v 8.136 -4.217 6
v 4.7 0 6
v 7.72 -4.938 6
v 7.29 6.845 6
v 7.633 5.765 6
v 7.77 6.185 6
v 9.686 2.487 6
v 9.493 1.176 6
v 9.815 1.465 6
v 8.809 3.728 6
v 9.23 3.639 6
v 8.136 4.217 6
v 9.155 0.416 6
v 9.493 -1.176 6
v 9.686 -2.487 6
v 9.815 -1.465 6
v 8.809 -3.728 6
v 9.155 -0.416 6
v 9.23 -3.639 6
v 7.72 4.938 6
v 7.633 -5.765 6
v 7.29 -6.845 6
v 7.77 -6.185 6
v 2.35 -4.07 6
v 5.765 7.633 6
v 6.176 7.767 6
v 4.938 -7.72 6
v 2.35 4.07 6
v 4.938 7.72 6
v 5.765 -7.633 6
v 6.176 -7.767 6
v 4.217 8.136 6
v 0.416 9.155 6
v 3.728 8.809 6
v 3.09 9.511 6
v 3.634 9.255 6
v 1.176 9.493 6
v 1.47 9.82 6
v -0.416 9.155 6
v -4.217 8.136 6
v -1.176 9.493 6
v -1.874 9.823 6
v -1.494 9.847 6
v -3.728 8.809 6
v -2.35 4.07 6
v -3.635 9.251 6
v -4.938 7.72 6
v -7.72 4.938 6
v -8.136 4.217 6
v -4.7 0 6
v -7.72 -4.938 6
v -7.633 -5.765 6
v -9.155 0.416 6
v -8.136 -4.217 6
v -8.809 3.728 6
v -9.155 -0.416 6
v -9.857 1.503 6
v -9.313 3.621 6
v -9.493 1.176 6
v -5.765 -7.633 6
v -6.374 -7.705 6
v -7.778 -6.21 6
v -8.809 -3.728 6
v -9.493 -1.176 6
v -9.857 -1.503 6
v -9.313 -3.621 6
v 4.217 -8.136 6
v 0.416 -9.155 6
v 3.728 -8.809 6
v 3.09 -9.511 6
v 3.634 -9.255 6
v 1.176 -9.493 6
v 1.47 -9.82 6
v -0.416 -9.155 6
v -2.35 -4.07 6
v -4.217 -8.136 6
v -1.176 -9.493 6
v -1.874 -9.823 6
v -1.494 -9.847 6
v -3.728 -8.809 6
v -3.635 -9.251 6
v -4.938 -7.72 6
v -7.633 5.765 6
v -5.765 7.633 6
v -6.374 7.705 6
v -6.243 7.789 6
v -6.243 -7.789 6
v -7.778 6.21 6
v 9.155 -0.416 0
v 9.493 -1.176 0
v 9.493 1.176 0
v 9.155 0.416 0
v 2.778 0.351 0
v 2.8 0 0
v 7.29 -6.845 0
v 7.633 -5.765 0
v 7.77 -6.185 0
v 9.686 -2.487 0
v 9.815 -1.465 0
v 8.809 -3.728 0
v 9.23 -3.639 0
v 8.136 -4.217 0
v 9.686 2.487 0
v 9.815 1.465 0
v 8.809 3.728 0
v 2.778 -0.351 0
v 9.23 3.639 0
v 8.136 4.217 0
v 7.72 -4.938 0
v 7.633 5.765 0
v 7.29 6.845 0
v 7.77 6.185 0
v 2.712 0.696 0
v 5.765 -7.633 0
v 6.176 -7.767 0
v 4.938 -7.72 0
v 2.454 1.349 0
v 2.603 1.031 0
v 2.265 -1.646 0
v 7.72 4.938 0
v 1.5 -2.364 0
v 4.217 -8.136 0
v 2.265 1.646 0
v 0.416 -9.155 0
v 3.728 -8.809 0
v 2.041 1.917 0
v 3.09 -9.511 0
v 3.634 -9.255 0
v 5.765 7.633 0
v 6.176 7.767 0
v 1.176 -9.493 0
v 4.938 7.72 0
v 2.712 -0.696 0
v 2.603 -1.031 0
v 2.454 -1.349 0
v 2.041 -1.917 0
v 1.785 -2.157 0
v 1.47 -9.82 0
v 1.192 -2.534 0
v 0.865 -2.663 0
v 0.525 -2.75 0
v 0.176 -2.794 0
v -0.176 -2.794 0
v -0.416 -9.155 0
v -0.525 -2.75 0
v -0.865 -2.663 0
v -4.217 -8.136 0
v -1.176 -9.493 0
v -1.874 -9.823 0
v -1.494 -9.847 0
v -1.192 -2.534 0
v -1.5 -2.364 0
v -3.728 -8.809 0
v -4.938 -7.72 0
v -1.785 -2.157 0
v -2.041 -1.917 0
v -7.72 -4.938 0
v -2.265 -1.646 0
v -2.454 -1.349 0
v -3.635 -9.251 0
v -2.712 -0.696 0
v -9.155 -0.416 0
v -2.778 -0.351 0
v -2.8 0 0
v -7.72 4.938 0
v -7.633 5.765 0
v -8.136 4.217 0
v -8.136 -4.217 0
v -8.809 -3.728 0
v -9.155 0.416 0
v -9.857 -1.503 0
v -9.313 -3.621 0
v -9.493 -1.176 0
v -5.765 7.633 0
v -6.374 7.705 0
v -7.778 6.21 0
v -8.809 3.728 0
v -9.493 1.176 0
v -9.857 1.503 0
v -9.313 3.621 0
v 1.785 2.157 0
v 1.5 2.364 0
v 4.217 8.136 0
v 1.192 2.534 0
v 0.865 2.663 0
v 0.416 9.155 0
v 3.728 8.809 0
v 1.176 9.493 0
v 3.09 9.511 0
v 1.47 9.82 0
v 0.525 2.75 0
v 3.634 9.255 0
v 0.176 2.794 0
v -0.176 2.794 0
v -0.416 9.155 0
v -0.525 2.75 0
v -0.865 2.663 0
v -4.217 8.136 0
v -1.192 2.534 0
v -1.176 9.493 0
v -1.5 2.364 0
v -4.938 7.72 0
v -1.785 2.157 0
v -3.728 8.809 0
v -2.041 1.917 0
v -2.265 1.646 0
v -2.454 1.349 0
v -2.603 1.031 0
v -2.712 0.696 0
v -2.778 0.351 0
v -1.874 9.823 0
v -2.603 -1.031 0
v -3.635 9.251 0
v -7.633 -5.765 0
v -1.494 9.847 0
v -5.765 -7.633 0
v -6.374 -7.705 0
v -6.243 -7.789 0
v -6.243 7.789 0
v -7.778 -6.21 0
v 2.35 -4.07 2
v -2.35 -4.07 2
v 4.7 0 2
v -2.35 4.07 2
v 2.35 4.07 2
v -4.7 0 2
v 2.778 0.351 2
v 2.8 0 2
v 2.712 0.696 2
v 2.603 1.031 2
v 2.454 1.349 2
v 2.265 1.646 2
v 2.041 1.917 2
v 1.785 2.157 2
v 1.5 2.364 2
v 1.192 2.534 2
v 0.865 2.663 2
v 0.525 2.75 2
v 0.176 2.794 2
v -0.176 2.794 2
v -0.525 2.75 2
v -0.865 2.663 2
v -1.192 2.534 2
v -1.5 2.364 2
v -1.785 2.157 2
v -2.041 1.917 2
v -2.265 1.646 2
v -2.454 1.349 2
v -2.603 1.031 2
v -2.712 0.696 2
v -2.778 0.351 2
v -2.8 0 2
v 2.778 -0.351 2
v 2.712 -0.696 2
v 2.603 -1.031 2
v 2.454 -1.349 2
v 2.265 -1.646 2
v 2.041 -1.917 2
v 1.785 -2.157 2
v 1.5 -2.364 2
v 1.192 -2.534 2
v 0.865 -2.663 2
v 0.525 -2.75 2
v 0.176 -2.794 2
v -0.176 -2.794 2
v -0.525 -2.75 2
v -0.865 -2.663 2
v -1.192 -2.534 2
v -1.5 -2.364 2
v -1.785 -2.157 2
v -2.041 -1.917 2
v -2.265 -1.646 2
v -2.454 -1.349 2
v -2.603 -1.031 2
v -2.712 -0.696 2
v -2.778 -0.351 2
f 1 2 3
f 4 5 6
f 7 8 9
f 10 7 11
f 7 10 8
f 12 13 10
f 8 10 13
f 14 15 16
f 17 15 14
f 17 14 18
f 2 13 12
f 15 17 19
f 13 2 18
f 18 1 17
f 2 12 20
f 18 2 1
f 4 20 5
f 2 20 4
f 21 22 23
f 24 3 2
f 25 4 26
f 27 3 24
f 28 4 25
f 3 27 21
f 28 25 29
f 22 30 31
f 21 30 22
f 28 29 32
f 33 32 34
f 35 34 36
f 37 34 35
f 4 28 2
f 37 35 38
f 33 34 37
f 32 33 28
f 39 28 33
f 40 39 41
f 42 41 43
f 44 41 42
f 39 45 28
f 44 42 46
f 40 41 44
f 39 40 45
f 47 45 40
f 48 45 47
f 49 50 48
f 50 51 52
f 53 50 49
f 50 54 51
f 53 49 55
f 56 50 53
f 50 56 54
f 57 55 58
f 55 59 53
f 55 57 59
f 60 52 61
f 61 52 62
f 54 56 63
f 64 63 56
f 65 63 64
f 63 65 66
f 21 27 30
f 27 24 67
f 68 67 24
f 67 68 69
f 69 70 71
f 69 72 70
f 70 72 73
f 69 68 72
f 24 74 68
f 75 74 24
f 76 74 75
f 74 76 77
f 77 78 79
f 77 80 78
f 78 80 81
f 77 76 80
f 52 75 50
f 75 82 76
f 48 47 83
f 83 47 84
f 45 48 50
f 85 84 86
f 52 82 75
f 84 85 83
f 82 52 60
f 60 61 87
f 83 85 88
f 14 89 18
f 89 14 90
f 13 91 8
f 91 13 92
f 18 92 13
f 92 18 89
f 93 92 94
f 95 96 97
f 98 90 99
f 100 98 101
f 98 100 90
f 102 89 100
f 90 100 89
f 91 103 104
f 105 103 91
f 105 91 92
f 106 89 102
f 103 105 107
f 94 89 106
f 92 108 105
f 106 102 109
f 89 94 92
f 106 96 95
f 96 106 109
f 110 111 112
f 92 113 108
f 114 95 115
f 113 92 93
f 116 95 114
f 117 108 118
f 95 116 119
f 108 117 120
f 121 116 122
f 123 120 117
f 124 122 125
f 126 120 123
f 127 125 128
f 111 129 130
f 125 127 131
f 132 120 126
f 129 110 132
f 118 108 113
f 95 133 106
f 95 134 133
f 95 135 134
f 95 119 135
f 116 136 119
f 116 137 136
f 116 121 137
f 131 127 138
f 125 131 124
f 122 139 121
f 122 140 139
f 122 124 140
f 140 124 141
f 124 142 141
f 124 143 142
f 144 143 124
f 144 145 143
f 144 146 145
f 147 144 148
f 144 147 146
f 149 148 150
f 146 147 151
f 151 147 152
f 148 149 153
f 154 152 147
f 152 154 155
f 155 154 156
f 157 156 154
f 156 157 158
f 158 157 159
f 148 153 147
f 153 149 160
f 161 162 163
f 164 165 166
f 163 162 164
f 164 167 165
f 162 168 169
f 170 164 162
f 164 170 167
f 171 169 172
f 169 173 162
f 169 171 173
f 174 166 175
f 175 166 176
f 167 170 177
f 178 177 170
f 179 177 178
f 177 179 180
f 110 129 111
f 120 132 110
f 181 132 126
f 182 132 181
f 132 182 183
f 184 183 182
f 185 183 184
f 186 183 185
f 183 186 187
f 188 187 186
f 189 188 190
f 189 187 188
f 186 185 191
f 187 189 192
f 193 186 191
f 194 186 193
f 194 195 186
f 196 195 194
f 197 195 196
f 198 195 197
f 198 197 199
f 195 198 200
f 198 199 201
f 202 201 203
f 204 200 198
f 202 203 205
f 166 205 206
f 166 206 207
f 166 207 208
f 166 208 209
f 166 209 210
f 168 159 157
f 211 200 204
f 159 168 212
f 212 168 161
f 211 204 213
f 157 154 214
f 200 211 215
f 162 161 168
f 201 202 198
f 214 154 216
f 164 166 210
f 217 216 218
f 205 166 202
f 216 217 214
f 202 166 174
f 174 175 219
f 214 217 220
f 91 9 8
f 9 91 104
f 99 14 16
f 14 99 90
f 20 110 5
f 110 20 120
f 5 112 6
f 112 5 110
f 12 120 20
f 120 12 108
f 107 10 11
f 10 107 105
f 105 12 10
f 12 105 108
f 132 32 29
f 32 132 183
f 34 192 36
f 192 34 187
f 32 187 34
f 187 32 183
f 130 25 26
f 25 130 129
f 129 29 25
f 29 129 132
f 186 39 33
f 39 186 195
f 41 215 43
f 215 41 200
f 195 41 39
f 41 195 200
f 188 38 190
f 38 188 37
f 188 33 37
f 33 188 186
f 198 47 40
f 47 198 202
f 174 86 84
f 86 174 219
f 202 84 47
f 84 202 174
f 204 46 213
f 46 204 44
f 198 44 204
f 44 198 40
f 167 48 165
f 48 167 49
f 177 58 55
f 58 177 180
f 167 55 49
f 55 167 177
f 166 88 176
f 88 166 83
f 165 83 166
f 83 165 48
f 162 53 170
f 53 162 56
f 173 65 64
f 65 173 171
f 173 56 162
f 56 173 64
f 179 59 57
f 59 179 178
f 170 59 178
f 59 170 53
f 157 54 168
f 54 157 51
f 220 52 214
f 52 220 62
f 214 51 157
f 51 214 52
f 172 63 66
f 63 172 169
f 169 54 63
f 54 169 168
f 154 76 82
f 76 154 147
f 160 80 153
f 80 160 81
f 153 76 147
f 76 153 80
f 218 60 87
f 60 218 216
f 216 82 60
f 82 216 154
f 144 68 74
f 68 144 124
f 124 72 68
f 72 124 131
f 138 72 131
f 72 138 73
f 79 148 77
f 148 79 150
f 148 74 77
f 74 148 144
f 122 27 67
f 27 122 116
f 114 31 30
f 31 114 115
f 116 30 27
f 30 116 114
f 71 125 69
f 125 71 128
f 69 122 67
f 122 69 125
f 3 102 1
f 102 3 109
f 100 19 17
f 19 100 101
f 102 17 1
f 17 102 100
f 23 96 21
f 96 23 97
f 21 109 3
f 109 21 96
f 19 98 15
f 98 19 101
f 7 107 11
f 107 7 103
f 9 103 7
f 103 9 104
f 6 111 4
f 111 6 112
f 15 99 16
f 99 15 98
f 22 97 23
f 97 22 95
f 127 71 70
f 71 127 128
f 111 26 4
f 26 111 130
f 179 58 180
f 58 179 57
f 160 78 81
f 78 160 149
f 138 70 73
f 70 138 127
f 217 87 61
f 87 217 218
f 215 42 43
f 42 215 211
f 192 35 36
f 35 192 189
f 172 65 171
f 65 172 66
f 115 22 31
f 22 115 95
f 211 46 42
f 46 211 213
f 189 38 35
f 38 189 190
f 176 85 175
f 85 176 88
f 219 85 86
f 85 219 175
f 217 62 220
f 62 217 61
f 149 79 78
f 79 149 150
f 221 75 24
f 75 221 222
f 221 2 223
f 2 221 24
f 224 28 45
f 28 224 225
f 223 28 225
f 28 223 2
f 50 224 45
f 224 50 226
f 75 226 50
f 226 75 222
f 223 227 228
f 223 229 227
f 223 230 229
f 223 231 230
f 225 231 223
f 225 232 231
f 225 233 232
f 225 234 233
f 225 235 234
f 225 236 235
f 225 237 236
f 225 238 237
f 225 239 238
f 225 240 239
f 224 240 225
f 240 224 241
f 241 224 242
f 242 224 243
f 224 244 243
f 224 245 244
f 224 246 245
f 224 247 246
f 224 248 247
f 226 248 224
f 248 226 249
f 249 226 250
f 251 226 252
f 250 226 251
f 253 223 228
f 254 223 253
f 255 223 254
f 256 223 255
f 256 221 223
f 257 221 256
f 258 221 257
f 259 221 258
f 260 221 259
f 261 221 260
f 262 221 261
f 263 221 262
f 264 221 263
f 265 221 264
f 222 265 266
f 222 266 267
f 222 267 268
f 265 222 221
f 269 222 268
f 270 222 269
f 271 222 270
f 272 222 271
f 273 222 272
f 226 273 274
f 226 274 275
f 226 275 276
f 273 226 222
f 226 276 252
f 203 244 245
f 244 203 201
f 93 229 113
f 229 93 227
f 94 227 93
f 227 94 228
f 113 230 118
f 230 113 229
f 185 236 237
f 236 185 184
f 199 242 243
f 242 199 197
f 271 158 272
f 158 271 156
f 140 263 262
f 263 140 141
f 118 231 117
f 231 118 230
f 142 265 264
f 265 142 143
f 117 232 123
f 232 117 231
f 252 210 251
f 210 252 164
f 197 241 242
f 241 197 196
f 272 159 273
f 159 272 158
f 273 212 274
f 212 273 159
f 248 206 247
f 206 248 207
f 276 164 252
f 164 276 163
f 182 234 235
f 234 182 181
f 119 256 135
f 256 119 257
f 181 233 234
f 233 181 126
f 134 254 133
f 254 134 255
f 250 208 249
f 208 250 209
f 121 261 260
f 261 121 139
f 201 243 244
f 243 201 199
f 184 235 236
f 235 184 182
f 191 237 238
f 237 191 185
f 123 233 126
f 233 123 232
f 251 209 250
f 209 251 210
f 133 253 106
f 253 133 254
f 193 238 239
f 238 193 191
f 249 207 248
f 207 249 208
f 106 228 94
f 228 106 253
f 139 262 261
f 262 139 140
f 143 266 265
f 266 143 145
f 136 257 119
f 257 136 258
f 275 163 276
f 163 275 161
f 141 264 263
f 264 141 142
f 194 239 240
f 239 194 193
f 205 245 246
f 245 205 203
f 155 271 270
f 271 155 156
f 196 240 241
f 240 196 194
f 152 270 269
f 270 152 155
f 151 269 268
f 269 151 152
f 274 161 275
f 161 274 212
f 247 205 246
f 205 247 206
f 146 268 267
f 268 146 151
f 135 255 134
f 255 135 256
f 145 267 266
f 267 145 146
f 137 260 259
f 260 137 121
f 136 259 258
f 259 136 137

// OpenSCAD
// Knurled hex nut holder
// Glyn Cowles Feb 2015
// Modified by n800s, 2019

// Total diameter of knob
totd=20;
// Height of knob
height=6;
// Nut diameter (point to point not flat to flat)
nutd=9;
// Gap
gap = 0.2;
// Number of knurls
knurls=12;
// M?
bolt_d = 5;
// Bottom height
bottom_h = 2;

difference() {
    cylinder(h=height, d=totd, $fn=25);
    cylinder(h=height, d=nutd+2*gap, $fn=6);
    for (r=[0:360/knurls:360]) {
        rotate([0,0,r]) translate([totd/1.8,0,0]) cylinder(h=height,r=(totd/5)/2,$fn=15);
    }
}
difference() {
	cylinder(h=bottom_h, d=nutd+gap+(totd-nutd)/2, $fn=50);
	cylinder(h=bottom_h, d=bolt_d+0.6, $fn=50);
}
